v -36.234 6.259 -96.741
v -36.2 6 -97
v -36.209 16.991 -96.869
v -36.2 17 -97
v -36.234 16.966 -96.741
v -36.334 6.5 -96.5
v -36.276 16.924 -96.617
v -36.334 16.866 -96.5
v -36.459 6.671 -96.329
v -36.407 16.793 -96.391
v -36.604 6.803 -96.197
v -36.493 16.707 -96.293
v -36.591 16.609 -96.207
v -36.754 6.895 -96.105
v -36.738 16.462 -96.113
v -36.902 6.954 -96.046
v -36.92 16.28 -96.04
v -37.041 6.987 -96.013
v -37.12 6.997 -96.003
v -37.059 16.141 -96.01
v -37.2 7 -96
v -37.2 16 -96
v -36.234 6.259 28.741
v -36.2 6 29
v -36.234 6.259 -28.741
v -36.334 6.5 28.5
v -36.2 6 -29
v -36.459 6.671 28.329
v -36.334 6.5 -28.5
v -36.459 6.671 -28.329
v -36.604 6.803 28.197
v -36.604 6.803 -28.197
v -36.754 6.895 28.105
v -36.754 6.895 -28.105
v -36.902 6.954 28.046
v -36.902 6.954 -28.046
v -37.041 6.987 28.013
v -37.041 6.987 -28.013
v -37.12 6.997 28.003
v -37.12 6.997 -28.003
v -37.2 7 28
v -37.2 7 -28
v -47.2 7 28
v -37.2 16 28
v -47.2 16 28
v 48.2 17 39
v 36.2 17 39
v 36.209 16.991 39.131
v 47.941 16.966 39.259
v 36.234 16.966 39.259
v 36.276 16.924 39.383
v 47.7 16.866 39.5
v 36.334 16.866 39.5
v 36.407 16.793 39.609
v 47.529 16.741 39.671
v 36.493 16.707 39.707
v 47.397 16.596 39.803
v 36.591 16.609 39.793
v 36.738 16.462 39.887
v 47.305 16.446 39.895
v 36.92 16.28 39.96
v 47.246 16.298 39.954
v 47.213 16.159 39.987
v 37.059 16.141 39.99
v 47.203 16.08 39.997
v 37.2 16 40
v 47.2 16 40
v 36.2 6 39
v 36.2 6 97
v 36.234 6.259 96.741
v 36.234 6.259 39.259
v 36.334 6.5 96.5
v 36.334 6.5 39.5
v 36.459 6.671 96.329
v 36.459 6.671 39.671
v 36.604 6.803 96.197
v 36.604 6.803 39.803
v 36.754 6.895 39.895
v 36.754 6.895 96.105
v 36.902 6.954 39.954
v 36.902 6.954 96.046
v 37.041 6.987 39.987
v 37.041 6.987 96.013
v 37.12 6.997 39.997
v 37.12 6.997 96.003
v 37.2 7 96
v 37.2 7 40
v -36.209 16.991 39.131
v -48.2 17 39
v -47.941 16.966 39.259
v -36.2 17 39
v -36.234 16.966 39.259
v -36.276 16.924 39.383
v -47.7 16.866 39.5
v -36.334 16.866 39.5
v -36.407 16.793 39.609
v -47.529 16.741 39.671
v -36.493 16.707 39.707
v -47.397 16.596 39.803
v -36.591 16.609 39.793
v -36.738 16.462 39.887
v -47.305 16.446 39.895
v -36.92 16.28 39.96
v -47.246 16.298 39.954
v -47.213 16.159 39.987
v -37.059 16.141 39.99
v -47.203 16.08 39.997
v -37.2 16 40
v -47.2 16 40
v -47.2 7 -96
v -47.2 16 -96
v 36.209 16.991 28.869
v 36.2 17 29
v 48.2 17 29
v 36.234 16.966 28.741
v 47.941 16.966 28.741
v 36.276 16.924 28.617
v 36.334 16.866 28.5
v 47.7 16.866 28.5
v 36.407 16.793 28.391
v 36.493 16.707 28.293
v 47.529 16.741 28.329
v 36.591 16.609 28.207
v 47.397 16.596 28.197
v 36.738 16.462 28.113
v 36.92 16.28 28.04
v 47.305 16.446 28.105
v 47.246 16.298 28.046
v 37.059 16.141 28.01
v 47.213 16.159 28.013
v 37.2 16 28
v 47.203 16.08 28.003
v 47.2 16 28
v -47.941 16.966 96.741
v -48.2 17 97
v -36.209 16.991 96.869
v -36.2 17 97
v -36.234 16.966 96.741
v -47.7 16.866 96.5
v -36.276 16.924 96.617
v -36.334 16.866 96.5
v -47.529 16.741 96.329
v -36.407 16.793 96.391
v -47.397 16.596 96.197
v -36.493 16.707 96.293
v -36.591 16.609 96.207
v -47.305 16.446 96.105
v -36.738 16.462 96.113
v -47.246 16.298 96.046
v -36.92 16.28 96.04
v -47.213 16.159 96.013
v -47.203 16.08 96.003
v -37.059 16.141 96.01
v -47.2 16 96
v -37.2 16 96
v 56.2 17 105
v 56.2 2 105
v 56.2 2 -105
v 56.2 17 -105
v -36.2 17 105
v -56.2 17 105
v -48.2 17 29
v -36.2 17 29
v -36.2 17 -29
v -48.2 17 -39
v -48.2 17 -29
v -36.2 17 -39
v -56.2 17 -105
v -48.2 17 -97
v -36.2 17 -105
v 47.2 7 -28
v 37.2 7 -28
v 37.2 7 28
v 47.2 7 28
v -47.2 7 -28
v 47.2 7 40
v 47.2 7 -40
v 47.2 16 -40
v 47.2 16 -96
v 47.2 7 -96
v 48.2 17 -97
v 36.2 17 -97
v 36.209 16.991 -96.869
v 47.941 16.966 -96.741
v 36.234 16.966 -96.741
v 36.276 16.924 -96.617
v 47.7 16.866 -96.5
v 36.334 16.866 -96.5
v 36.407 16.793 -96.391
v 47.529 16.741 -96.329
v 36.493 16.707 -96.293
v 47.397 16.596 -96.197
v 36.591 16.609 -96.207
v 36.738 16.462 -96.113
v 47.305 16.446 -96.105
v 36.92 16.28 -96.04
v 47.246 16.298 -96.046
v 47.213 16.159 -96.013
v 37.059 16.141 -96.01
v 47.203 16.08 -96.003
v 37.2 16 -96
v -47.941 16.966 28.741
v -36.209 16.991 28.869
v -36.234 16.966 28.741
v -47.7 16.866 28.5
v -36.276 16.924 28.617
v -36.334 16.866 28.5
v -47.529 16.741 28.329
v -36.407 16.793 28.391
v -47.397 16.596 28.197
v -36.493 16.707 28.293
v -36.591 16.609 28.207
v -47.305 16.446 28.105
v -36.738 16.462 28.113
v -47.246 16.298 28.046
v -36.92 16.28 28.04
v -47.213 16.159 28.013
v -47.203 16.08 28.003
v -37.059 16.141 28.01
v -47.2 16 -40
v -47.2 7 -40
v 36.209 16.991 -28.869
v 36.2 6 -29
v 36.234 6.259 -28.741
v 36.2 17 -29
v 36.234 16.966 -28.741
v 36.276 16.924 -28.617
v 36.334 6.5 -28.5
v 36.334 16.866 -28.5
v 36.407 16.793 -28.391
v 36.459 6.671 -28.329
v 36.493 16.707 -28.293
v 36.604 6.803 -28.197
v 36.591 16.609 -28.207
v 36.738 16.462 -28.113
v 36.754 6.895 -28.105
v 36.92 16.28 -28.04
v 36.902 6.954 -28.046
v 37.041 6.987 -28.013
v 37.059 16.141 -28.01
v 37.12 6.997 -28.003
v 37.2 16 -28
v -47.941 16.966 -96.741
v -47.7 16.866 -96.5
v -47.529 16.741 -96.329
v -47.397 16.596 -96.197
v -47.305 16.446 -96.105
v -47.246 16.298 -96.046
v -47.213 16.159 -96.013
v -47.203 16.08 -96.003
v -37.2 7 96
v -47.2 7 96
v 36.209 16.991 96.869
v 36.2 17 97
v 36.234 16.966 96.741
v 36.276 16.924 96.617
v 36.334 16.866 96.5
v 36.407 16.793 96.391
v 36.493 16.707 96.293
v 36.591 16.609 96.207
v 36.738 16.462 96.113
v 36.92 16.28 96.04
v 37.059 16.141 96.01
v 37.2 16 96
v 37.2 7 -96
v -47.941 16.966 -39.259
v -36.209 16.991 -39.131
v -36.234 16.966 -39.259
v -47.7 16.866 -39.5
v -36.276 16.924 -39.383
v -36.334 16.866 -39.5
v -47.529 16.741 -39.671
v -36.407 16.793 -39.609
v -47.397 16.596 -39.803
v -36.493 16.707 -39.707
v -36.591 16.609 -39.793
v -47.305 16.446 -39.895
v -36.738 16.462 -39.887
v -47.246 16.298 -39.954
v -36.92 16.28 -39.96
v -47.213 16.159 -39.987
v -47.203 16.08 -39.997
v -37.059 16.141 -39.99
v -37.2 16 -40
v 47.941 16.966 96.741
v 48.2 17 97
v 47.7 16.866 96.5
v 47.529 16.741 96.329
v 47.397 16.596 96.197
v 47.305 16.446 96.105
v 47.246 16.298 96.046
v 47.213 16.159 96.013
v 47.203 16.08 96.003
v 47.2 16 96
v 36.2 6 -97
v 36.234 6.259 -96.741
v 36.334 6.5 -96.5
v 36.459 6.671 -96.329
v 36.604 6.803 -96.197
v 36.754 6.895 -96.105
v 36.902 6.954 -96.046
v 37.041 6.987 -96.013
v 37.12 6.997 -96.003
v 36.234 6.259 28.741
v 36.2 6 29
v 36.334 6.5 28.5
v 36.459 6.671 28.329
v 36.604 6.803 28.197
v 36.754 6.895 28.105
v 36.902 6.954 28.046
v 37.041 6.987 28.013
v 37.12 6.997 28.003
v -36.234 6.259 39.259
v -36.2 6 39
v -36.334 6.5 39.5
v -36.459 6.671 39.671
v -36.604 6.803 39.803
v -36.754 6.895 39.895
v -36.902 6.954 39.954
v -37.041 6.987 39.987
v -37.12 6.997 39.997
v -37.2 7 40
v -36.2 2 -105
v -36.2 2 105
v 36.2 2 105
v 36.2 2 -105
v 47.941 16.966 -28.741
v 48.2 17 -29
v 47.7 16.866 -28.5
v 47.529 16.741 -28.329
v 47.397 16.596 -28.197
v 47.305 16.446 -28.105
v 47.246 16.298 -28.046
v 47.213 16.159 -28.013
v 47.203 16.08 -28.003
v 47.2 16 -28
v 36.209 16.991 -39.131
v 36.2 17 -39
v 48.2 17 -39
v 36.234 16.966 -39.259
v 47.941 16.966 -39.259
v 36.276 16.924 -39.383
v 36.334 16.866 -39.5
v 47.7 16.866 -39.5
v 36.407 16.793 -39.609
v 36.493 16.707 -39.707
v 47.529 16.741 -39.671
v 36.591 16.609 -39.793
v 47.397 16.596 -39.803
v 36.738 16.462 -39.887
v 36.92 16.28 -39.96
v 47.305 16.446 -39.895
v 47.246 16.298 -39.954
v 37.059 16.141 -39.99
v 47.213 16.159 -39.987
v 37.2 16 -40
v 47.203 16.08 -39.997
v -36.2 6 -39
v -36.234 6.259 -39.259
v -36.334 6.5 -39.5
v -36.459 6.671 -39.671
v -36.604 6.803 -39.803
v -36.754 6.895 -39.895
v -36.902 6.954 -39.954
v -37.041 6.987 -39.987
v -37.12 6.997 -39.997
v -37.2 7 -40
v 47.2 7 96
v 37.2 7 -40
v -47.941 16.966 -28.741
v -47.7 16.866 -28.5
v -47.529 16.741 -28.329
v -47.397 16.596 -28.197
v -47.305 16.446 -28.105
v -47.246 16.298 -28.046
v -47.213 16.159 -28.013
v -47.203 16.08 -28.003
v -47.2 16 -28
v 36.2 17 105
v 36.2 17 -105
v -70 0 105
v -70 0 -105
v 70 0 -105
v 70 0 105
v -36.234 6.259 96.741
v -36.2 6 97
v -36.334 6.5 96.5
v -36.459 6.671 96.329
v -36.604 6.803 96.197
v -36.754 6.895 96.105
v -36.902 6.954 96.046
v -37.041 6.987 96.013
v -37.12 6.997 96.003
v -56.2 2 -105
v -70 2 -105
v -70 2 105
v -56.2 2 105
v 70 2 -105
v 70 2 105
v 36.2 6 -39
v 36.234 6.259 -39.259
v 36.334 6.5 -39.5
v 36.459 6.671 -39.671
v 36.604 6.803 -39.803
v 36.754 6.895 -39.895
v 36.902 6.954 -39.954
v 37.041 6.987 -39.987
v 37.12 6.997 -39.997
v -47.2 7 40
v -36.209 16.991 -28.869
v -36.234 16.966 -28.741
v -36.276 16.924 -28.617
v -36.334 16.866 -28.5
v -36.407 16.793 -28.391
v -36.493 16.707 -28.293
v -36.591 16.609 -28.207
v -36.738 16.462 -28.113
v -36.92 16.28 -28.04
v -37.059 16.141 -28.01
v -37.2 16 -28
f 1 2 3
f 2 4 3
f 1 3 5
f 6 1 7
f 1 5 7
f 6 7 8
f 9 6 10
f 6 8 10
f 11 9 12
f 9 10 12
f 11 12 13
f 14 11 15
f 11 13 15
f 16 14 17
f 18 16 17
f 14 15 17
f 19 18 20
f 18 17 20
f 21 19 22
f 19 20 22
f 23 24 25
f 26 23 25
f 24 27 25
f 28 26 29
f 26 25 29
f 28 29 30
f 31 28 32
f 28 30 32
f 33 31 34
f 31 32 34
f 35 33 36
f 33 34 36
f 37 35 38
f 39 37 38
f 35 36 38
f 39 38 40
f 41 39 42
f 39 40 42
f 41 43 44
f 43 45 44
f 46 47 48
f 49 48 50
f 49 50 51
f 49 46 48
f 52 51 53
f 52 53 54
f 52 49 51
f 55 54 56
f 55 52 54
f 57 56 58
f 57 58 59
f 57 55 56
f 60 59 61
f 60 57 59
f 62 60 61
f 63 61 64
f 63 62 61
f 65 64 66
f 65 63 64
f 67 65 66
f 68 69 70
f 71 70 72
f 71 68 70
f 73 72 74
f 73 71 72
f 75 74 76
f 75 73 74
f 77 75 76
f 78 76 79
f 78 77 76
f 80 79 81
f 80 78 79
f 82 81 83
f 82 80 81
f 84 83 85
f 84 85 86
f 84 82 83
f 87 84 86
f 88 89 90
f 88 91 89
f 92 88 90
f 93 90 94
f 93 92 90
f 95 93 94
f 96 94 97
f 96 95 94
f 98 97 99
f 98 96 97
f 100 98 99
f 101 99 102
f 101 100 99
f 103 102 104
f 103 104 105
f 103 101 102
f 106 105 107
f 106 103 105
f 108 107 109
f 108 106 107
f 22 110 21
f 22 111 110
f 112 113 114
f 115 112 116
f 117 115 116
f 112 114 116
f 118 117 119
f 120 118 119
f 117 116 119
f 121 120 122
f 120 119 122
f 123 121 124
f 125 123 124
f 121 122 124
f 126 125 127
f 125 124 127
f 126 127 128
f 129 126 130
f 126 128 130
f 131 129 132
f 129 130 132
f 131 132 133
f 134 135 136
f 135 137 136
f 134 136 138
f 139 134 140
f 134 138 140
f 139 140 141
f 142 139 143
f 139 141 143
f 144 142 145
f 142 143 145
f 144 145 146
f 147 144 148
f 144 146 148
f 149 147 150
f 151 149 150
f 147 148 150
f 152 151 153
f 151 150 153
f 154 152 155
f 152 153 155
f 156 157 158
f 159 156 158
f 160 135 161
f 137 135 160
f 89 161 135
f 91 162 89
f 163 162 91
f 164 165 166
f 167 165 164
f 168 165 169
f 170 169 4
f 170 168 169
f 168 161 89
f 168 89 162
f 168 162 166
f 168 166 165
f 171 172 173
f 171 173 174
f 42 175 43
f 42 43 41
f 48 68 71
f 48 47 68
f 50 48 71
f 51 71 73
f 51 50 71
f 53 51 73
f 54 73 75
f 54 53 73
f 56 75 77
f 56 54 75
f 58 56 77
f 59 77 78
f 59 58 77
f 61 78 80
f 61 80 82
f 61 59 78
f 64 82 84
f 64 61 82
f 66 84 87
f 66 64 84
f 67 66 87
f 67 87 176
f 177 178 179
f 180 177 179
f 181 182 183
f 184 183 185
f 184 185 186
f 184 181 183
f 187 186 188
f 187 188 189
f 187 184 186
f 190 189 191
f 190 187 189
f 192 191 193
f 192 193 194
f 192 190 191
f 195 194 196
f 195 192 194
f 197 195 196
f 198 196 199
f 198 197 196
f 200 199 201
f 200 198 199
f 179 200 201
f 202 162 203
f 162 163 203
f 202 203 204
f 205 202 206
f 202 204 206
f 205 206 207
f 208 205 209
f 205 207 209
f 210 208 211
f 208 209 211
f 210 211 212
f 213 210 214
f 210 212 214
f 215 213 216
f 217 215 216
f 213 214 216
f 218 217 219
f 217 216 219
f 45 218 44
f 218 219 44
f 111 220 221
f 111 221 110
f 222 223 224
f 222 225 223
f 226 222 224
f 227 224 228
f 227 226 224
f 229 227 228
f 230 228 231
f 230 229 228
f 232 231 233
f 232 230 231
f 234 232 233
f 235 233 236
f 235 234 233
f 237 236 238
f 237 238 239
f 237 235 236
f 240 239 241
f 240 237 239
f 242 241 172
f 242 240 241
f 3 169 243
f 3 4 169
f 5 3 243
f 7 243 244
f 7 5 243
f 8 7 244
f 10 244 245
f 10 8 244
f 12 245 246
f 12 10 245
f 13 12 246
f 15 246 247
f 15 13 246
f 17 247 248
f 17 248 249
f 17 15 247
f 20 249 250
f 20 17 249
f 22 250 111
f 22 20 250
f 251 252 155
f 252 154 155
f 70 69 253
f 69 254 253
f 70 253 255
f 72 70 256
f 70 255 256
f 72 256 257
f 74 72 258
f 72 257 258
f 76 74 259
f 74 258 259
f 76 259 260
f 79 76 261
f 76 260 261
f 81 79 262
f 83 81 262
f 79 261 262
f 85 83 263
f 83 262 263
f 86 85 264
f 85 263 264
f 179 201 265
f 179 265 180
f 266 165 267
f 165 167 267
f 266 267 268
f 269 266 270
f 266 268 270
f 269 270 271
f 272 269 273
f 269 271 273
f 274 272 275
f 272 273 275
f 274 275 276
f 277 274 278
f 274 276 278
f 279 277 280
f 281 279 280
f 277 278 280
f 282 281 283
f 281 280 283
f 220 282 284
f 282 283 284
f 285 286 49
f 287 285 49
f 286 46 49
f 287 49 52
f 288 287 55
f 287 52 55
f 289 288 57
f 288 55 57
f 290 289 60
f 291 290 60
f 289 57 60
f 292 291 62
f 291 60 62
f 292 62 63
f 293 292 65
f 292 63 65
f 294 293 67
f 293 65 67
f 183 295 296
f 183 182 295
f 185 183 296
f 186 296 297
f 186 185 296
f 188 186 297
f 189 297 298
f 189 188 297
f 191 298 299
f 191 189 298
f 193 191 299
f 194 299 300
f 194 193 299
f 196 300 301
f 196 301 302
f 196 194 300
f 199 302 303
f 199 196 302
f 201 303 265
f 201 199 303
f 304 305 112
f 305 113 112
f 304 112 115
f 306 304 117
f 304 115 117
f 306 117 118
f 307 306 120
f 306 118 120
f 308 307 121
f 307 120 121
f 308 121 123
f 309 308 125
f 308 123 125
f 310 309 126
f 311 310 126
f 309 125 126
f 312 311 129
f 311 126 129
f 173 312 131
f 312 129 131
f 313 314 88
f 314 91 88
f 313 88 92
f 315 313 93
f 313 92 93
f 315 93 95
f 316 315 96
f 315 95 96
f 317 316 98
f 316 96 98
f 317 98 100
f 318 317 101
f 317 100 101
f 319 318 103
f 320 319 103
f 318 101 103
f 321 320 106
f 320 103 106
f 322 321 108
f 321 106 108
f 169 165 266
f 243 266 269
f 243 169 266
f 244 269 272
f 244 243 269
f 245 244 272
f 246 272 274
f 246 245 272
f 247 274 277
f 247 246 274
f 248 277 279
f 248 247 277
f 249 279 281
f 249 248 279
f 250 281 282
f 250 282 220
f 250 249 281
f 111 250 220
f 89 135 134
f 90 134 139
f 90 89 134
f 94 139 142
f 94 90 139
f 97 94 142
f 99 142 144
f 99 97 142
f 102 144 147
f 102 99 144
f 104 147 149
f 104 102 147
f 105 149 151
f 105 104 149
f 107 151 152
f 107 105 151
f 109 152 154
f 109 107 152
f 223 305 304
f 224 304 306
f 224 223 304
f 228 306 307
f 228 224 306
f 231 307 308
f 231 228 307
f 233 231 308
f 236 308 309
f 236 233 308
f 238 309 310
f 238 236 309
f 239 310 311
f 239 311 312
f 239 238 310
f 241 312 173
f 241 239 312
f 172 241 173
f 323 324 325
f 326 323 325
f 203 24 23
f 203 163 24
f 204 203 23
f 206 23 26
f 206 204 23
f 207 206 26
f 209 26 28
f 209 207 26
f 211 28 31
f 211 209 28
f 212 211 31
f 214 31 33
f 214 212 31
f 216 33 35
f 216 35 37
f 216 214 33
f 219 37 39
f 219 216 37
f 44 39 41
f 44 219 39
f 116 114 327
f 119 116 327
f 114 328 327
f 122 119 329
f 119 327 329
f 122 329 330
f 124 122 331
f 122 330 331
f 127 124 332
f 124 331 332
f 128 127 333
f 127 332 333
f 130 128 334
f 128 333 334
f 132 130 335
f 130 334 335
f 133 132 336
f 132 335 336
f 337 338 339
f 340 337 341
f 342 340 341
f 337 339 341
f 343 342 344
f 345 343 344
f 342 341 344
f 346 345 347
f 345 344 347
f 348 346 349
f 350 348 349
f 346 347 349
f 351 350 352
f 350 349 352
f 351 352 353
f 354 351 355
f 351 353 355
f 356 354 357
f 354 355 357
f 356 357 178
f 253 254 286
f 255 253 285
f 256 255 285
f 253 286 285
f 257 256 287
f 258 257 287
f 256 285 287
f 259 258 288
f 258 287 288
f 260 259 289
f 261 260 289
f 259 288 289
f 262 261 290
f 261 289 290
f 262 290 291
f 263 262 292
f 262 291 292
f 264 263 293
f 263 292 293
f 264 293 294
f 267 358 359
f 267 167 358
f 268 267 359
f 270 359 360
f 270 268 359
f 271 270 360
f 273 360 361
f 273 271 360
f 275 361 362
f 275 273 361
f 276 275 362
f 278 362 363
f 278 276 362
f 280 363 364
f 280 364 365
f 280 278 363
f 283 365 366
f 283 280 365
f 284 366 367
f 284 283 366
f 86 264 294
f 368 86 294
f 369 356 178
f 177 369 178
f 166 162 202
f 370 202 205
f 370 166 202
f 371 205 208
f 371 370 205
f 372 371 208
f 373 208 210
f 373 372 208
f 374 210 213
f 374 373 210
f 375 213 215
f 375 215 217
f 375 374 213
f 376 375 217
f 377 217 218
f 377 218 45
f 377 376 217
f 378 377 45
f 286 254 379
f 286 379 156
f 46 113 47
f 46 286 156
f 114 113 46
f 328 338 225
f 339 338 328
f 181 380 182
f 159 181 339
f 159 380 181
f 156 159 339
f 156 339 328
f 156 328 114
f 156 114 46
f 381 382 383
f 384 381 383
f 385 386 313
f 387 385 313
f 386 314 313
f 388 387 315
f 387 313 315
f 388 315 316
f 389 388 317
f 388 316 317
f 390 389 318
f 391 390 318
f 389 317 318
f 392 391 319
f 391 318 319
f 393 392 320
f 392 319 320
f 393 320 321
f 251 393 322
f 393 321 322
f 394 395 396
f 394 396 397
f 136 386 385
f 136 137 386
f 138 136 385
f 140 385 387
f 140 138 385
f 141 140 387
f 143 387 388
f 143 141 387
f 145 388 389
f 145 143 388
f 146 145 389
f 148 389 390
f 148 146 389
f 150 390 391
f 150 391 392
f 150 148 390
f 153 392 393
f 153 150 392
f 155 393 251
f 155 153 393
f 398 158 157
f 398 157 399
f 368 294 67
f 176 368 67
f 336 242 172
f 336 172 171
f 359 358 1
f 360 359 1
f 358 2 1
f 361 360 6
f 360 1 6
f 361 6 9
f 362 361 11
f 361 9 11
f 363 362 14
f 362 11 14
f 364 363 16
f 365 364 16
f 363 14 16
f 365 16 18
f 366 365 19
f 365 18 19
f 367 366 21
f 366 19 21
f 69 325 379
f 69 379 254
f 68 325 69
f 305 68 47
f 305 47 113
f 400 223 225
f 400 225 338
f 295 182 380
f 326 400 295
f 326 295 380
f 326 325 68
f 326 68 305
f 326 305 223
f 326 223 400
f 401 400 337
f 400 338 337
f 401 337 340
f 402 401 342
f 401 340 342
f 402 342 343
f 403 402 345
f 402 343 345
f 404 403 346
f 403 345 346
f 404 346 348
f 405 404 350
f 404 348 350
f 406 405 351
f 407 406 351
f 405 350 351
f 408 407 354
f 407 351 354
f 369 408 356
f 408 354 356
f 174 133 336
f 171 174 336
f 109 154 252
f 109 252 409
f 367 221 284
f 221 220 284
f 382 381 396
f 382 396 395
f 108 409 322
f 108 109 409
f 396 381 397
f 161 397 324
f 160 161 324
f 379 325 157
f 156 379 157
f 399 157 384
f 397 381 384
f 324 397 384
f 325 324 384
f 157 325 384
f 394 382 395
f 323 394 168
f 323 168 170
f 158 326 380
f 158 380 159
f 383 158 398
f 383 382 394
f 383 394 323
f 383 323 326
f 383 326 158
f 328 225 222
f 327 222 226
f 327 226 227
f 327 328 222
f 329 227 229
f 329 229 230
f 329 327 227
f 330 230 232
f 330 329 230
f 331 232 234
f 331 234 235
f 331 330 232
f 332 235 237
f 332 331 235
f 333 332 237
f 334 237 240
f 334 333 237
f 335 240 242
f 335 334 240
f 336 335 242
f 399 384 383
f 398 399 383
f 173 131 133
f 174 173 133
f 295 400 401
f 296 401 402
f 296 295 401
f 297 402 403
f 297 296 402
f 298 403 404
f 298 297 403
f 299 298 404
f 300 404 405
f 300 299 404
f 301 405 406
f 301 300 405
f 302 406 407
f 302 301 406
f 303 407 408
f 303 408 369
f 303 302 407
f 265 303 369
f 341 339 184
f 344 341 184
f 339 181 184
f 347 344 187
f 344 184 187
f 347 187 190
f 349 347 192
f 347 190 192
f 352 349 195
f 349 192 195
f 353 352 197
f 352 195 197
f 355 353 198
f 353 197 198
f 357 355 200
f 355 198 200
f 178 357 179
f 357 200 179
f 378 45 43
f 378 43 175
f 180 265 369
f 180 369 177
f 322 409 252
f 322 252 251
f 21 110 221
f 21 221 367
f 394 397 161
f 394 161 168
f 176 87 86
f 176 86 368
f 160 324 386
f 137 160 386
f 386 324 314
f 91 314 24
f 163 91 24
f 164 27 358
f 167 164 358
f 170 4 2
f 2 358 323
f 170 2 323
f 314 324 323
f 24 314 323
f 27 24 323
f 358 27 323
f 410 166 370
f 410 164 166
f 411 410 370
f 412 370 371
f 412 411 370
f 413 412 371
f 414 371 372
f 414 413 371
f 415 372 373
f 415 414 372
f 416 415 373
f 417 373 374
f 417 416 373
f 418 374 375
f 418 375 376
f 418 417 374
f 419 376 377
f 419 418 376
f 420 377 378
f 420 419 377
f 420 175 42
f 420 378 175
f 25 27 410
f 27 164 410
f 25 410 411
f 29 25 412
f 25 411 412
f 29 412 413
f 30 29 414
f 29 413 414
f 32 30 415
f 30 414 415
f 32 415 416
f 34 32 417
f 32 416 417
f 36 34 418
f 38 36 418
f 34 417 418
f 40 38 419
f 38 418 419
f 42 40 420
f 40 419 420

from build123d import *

# Parameters (mm, degrees)
SKIZZE1_W                       = 140
SKIZZE1_H                       = 210
AUFSATZ_LINEAR_AUSTRAGEN1_DEPTH = 2
SKIZZE2_W                       = 20
SKIZZE2_H                       = 210
AUFSATZ_LINEAR_AUSTRAGEN2_DEPTH = 15
SKIZZE3_W                       = 94.4
SKIZZE3_H                       = 56
SCHNITT_LINEAR_AUSTRAGEN1_DEPTH = 10
VERRUNDUNG1_R                   = 1


with BuildPart() as part:
    # Skizze1 → Aufsatz-Linear austragen1 (new body)
    with BuildSketch(Plane(origin=(0, 0, 0), x_dir=(1, 0, 0), z_dir=(0, 1, 0))):
        Rectangle(SKIZZE1_W, SKIZZE1_H)
    extrude(amount=AUFSATZ_LINEAR_AUSTRAGEN1_DEPTH)

    # Skizze2 → Aufsatz-Linear austragen2 (add)
    with BuildSketch(Plane(origin=(0, 2, 0), x_dir=(1, 0, 0), z_dir=(0, 1, 0))):
        with Locations((-46.2, 0)):
            Rectangle(SKIZZE2_W, SKIZZE2_H)
        with Locations((46.2, 0)):
            Rectangle(SKIZZE2_W, SKIZZE2_H)
    extrude(amount=AUFSATZ_LINEAR_AUSTRAGEN2_DEPTH)

    # Skizze3 → Schnitt-Linear austragen1 (cut)
    with BuildSketch(Plane(origin=(0, 17, 0), x_dir=(1, 0, 0), z_dir=(0, 1, 0))):
        Rectangle(SKIZZE3_W, SKIZZE3_H)
        with Locations((0, -68)):
            Rectangle(SKIZZE3_W, SKIZZE3_H)
        with Locations((0, 68)):
            Rectangle(SKIZZE3_W, SKIZZE3_H)
    extrude(amount=-SCHNITT_LINEAR_AUSTRAGEN1_DEPTH, mode=Mode.SUBTRACT)

    # Verrundung1
    verrundung1_edges = [part.edges().sort_by_distance(p)[0] for p in [
        (41.7, 17, 28),
        (41.7, 17, -40),
        (41.7, 17, 96),
        (36.2, 7, 0),
        (36.2, 7, -68),
        (36.2, 7, 68),
        (-36.2, 7, 68),
        (-41.7, 17, 40),
        (-47.2, 17, 68),
        (-41.7, 17, 96),
        (47.2, 17, 68),
        (41.7, 17, 40),
        (-36.2, 12, 96),
        (36.2, 12, 96),
        (-36.2, 12, 40),
        (36.2, 12, 40),
        (-36.2, 7, -68),
        (-41.7, 17, -96),
        (-47.2, 17, -68),
        (-41.7, 17, -40),
        (47.2, 17, -68),
        (41.7, 17, -96),
        (-36.2, 12, -40),
        (36.2, 12, -40),
        (-36.2, 12, -96),
        (36.2, 12, -96),
        (-36.2, 7, 0),
        (-41.7, 17, -28),
        (-47.2, 17, 0),
        (-41.7, 17, 28),
        (47.2, 17, 0),
        (41.7, 17, -28),
        (-36.2, 12, 28),
        (36.2, 12, 28),
        (-36.2, 12, -28),
        (36.2, 12, -28),
    ]]
    fillet(verrundung1_edges, radius=VERRUNDUNG1_R)


solid = part.part
